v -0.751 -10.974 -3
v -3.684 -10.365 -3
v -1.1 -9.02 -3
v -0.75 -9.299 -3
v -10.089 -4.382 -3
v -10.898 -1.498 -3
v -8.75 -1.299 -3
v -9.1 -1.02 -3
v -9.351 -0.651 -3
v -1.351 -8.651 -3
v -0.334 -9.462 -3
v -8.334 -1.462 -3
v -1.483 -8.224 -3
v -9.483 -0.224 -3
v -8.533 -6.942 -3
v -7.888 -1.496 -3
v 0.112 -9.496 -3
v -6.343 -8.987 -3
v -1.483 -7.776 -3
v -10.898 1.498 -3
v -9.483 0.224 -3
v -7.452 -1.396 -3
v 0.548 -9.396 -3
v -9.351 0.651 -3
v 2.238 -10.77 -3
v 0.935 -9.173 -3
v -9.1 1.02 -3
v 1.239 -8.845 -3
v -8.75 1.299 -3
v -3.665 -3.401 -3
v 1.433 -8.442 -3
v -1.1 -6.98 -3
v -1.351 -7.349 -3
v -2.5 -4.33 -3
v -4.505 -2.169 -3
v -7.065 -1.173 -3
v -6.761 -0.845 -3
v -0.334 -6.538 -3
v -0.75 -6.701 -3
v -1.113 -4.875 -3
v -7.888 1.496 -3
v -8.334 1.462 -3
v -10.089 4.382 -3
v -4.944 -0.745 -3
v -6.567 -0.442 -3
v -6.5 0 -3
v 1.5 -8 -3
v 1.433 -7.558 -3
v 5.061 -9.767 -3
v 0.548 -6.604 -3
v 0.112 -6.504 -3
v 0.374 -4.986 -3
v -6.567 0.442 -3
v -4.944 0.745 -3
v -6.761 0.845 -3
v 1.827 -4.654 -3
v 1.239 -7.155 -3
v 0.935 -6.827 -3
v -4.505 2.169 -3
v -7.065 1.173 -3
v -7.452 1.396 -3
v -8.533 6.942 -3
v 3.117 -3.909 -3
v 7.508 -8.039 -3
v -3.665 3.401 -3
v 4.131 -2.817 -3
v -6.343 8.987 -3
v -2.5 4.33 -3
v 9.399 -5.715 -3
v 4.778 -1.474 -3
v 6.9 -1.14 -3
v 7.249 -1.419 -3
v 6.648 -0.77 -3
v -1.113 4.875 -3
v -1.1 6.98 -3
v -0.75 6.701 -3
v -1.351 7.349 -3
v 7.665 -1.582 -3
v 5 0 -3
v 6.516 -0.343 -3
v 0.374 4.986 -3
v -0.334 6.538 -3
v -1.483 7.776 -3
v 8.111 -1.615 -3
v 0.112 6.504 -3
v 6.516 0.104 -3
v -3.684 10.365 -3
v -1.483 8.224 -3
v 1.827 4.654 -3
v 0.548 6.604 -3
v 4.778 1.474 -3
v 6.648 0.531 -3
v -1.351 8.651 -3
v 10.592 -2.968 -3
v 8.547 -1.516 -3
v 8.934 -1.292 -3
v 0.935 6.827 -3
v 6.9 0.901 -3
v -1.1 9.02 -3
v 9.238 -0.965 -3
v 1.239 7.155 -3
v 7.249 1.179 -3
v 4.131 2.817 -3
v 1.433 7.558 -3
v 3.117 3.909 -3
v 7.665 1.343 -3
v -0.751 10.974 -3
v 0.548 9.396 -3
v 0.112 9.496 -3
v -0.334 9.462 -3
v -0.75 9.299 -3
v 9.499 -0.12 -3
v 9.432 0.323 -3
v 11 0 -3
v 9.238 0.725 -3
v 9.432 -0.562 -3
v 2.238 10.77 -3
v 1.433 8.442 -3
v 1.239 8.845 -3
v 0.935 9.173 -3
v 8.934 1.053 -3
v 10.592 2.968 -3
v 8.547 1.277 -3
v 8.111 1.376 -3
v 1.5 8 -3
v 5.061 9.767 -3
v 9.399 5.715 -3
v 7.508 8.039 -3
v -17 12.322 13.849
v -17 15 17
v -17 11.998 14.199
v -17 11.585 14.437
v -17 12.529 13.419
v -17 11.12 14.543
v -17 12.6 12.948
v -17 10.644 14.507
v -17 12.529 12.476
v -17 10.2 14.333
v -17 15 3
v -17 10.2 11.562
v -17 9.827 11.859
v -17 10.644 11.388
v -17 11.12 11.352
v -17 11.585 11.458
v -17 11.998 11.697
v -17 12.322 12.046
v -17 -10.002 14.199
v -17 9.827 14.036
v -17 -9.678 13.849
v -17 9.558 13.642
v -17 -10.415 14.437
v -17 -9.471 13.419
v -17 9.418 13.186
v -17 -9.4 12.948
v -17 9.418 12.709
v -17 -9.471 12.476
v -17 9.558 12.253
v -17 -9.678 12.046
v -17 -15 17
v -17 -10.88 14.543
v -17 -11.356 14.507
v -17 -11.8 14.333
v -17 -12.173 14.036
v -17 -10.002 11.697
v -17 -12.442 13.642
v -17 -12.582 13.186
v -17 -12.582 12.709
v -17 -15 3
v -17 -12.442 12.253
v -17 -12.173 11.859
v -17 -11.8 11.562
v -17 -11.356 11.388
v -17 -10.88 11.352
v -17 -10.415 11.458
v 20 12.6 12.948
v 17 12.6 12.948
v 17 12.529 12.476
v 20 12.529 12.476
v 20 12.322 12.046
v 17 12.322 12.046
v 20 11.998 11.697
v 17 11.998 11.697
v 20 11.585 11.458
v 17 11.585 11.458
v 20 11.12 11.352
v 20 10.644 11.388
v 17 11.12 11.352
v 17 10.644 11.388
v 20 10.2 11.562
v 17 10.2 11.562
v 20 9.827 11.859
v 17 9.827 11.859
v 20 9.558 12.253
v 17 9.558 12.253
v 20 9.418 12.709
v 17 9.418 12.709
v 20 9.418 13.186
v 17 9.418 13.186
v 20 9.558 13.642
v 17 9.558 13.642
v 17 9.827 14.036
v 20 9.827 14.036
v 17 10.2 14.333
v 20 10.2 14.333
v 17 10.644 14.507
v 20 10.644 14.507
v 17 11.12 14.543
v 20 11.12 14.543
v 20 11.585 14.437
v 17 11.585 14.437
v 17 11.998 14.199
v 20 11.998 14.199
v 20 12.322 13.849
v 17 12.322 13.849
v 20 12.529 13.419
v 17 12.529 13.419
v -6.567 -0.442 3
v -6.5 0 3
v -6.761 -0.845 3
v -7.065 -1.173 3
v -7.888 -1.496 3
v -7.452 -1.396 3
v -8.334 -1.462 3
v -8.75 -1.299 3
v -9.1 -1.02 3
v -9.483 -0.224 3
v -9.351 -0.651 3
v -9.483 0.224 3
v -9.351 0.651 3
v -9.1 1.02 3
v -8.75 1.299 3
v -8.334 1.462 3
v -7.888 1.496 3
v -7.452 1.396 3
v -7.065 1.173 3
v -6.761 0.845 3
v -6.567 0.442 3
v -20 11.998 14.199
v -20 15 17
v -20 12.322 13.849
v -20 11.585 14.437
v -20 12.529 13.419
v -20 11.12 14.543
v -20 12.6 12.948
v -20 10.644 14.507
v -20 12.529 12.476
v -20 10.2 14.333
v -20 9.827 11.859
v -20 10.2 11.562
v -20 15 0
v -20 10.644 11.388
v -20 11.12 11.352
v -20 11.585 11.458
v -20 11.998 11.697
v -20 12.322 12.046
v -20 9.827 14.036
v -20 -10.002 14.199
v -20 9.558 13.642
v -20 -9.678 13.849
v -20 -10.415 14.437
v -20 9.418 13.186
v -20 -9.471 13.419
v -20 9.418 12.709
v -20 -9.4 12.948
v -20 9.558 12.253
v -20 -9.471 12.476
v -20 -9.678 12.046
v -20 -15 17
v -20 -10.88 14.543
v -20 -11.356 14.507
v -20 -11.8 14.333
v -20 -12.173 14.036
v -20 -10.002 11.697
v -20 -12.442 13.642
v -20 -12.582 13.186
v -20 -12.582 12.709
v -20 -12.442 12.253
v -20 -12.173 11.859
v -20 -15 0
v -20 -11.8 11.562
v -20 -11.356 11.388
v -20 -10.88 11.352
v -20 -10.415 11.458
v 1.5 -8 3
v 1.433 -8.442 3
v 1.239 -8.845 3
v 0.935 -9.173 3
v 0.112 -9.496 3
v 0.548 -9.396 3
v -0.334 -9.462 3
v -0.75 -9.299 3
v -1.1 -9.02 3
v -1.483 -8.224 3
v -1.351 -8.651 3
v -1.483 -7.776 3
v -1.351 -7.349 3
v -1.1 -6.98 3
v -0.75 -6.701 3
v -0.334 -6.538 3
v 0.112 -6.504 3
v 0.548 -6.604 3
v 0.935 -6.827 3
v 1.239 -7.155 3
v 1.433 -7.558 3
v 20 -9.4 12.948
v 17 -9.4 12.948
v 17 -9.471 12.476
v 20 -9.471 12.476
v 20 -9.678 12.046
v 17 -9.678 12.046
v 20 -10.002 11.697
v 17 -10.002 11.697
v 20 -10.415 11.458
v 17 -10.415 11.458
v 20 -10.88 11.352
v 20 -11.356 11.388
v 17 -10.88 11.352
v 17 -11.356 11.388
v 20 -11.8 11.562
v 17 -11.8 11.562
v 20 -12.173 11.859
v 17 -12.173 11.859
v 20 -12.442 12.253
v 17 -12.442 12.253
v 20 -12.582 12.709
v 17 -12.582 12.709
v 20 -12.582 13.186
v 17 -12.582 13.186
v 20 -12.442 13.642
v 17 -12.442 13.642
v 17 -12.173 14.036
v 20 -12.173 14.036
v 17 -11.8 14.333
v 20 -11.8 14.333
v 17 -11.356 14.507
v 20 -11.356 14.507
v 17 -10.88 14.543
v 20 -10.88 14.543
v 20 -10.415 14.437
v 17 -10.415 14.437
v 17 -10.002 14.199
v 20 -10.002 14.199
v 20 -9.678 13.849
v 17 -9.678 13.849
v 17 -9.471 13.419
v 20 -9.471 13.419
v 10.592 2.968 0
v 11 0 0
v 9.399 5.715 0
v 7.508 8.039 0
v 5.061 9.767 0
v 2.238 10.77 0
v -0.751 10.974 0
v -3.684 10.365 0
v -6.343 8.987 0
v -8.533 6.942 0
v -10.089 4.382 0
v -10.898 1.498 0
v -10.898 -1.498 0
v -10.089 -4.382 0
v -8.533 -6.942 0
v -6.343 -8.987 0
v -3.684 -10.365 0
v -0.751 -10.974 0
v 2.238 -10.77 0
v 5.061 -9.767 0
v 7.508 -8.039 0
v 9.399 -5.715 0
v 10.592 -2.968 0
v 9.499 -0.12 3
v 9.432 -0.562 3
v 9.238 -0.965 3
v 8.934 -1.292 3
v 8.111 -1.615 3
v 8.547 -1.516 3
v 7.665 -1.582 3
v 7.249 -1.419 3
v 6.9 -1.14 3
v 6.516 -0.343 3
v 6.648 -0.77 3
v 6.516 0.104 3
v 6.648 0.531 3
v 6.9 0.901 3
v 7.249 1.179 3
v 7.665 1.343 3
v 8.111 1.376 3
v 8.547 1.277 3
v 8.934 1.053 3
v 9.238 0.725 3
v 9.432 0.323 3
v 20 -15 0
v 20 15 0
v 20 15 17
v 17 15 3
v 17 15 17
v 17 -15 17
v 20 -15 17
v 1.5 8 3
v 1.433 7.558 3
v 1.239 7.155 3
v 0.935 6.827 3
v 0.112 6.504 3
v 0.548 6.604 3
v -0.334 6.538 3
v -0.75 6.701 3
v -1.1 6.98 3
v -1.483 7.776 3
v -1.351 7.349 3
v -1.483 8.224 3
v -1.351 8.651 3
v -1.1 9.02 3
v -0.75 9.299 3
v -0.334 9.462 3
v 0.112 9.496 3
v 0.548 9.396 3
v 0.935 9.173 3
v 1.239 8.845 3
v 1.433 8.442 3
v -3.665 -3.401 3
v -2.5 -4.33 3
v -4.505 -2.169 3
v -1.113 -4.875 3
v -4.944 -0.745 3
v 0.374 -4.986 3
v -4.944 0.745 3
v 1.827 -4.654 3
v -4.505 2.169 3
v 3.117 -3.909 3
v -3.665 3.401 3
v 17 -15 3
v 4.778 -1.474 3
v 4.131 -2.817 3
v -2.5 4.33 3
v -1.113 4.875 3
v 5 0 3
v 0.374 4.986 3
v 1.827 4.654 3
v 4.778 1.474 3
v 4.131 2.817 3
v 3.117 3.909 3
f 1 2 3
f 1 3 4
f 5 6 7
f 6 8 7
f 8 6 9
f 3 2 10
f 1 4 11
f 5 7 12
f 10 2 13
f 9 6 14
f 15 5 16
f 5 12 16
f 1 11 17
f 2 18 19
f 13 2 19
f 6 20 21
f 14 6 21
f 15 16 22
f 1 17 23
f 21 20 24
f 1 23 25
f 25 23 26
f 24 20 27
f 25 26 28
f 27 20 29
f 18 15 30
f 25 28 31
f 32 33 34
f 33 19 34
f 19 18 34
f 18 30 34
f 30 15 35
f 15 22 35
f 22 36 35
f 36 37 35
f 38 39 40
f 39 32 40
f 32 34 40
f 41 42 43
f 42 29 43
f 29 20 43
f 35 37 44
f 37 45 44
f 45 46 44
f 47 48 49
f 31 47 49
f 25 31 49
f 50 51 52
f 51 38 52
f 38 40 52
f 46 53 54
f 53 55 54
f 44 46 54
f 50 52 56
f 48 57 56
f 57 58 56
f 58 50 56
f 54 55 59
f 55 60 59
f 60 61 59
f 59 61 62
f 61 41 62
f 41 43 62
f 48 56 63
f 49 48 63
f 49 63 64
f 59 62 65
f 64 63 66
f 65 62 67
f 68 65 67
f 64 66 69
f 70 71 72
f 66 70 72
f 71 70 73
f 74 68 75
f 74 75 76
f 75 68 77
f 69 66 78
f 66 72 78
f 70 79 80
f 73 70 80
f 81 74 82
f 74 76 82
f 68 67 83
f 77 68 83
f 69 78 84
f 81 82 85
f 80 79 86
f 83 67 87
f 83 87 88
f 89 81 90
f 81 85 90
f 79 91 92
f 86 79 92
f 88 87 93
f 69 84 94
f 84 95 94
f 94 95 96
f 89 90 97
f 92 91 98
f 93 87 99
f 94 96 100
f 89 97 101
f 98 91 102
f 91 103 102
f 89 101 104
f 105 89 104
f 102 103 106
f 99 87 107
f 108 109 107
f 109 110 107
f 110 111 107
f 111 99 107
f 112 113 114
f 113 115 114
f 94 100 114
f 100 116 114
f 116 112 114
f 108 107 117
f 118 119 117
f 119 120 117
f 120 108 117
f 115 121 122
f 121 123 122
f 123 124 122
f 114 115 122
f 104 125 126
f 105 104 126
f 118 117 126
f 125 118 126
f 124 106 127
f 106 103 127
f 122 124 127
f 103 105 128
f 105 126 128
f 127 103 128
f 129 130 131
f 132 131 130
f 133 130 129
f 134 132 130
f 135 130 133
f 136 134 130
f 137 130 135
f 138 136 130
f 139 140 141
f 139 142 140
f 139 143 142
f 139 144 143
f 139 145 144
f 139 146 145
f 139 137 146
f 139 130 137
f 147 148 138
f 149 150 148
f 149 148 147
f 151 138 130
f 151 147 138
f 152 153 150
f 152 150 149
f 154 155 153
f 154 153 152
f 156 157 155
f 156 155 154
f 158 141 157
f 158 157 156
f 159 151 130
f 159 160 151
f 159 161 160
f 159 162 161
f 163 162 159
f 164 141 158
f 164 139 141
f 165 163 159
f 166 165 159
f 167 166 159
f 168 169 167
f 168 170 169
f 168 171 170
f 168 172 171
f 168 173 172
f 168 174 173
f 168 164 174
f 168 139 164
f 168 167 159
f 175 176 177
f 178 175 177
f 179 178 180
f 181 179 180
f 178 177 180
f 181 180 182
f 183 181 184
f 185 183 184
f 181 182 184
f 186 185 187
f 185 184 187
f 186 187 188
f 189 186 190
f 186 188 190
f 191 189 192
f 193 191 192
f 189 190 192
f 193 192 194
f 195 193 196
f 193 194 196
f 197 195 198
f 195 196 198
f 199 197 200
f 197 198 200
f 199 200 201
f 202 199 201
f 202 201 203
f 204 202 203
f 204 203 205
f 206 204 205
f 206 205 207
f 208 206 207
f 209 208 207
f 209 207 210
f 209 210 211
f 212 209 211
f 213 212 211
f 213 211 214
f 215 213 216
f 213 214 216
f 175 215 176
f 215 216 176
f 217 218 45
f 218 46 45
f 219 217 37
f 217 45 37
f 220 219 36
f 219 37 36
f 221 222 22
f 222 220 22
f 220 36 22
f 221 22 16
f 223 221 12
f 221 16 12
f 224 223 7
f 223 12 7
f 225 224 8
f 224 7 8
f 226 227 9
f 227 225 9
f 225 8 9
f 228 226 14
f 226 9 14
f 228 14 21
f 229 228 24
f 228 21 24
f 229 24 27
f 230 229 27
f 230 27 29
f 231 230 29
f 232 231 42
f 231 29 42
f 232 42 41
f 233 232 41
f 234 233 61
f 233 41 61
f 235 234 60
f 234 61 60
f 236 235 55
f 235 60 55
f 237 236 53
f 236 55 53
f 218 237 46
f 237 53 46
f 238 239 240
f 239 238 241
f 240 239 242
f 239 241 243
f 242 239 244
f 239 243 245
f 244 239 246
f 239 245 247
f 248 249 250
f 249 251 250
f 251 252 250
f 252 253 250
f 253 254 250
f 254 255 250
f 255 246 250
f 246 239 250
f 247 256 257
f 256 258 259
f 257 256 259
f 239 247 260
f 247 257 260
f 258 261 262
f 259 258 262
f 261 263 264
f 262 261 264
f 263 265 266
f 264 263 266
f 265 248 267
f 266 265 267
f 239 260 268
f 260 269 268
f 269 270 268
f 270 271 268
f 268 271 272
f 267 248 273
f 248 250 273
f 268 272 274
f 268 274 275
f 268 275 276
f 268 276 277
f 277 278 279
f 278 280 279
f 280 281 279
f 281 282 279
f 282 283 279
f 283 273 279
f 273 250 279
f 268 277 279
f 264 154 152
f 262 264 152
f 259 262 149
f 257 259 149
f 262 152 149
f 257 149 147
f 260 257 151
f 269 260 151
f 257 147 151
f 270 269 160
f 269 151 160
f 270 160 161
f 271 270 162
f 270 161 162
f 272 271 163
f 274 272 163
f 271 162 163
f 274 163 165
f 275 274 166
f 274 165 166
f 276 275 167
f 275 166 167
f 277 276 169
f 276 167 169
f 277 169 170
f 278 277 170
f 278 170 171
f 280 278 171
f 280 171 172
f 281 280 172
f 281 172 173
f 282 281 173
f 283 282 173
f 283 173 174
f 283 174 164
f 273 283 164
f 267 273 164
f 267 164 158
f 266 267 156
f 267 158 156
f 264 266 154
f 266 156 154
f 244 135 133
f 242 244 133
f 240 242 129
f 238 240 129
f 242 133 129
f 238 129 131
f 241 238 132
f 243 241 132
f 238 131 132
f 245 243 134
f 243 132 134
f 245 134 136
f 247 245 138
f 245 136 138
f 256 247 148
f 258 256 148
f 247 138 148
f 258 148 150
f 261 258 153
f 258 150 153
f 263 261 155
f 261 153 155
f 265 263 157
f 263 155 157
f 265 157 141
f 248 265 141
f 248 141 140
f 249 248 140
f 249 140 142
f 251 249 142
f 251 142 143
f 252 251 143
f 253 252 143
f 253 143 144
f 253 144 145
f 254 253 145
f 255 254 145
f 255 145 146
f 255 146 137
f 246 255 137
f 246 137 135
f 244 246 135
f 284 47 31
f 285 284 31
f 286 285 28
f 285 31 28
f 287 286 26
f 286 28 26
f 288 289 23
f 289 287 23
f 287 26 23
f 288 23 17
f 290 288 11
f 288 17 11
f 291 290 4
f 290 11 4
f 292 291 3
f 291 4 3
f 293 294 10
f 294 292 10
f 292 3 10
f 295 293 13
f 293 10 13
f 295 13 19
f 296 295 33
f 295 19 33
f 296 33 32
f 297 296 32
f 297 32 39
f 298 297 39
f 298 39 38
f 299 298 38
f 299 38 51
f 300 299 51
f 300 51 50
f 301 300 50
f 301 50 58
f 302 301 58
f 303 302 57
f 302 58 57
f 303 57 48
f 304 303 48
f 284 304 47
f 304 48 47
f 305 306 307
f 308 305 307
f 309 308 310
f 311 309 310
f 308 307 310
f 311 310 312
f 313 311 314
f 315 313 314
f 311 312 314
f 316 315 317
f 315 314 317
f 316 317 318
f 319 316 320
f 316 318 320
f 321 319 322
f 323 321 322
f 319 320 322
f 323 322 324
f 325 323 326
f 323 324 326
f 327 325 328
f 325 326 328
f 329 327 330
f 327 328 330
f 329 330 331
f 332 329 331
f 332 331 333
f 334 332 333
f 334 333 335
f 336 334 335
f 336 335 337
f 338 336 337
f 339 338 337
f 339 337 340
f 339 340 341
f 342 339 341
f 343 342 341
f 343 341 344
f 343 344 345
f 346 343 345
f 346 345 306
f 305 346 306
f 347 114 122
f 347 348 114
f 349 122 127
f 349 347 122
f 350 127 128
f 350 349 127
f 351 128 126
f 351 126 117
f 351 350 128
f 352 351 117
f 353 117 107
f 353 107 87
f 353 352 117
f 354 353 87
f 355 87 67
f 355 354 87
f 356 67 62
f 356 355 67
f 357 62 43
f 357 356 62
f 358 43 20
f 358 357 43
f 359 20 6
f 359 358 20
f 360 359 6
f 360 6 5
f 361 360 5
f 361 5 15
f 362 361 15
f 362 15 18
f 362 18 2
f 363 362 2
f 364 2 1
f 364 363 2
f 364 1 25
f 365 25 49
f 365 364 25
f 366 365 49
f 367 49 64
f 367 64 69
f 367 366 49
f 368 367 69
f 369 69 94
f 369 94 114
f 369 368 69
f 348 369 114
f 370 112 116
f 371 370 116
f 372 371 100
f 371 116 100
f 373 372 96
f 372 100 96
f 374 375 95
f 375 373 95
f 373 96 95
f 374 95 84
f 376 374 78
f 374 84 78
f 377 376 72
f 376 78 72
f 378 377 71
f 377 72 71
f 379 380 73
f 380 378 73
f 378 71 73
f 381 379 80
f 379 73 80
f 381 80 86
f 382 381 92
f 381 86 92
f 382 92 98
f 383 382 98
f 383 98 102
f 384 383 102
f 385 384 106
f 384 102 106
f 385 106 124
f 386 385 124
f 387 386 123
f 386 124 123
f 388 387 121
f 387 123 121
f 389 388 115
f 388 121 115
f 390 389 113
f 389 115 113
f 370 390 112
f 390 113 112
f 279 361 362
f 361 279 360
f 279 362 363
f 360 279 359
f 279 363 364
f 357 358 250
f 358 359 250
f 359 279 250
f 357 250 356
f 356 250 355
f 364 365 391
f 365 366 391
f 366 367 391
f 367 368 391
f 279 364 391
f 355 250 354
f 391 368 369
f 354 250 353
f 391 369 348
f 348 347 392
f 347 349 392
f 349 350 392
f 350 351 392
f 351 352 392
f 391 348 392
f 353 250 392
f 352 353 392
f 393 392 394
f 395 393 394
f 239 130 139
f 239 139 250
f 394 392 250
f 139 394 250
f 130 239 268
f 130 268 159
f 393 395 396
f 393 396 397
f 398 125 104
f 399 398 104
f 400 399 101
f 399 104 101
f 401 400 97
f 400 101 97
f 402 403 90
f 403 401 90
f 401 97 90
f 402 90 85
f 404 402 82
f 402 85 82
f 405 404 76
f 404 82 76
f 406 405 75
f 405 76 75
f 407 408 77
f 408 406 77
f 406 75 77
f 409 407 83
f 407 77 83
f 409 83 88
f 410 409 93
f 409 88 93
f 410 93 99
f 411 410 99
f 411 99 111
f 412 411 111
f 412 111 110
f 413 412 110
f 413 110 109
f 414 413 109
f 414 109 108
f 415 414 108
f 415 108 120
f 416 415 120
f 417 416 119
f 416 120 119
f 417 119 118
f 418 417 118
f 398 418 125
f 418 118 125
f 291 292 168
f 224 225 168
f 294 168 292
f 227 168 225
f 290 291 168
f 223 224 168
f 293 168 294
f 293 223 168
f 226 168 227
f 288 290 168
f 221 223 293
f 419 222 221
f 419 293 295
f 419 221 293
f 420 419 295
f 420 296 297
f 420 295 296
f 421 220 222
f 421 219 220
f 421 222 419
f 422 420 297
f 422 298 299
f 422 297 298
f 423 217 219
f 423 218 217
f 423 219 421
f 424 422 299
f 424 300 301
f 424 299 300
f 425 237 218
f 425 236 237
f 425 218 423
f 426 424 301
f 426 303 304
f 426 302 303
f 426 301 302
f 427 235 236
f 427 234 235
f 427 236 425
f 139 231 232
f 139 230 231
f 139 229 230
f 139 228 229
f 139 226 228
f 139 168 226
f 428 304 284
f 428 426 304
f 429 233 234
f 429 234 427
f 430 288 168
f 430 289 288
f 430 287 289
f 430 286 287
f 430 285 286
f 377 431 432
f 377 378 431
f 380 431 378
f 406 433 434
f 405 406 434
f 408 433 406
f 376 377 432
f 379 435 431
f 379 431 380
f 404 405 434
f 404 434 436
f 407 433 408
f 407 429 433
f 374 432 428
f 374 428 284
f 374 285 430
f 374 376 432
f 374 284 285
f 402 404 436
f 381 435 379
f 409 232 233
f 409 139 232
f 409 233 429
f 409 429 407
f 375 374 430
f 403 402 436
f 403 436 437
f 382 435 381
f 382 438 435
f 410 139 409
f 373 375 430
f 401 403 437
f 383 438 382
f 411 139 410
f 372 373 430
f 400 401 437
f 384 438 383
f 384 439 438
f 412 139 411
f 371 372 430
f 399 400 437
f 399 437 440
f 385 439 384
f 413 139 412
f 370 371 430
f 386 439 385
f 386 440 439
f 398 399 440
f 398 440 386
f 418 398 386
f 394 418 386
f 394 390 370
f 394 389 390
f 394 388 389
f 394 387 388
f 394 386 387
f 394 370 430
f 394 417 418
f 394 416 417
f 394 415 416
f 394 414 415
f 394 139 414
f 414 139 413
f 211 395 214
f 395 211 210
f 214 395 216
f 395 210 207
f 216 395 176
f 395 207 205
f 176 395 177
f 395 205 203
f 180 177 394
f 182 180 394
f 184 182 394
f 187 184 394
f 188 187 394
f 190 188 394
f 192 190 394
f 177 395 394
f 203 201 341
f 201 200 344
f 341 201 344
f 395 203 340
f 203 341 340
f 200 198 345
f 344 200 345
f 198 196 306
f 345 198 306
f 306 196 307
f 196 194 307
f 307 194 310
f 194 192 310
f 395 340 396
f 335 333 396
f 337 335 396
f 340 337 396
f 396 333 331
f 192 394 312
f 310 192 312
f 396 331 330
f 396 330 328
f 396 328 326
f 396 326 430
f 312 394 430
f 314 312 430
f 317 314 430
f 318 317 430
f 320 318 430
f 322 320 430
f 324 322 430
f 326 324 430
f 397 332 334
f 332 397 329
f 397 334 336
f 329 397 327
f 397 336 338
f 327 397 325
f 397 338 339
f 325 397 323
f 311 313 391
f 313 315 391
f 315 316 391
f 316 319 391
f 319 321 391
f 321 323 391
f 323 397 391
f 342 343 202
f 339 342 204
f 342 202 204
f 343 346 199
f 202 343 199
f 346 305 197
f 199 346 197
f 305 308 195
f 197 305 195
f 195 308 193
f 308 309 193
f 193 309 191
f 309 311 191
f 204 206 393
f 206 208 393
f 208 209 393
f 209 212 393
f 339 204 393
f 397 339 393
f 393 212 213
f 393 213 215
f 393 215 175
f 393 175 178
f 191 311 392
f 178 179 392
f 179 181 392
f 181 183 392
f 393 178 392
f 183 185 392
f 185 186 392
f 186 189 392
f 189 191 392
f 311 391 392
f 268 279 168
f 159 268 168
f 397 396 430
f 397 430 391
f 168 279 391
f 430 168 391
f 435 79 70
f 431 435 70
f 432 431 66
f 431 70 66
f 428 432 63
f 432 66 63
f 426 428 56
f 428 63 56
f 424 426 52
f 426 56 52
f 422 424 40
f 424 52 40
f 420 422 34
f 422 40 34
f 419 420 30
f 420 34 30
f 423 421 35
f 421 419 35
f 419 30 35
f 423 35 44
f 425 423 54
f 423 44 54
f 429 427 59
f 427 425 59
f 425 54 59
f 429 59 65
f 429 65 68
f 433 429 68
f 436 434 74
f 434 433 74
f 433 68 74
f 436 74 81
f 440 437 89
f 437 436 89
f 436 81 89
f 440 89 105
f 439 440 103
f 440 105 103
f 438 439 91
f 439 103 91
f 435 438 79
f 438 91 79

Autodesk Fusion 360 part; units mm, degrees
sketch "Sketch1" plane through (0, 0, 0) normal (0, 0, 1) x (1, 0, 0)
  line L0 (20, 15) -> (-20, 15)
  line L1 (-20, 15) -> (-20, -15)
  line L2 (-20, -15) -> (20, -15)
  line L3 (20, -15) -> (20, 15)
  line L4 (20, 15) -> (-20, -15) construction
  line L5 (-20, 15) -> (20, -15) construction
  circle A0 centre (0, 0) radius 11
  circle A1 centre (0, 0) radius 8 construction
  circle A2 centre (0, 0) radius 5
  circle A3 centre (0, 8) radius 1.5
  circle A4 centre (0, -8) radius 1.5
  circle A5 centre (7.9991, -0.1196) radius 1.5
  circle A6 centre (-8, 0) radius 1.5
  line L6 (-20, 15) -> (-17, 15)
  line L7 (-17, 15) -> (-17, -15)
  line L8 (-17, -15) -> (-20, -15)
  line L9 (-20, -15) -> (-20, 15)
  line L10 (-20, 15) -> (-17, -15) construction
  line L11 (-17, 15) -> (-20, -15) construction
  line L12 (0, 15) -> (0, -15) construction
  line L13 (20, -15) -> (20, 15)
  line L14 (17, 15) -> (17, -15)
  line L15 (17, -15) -> (20, -15)
  line L16 (20, 15) -> (17, 15)
  point P0 (-18.5, 0)
  dimension "d1" = 40
  dimension "d2" = 30
  dimension "d3" = 22
  dimension "d4" = 16
  dimension "d5" = 10
  dimension "d6" = 3
  dimension "d7" = 3
  dimension "d9" = 3
  dimension "d10" = 3
  dimension "d11" = 30
  dimension "d12" = 3
extrude "Extrude1" add sketch "Sketch1" along normal blind 3 contours L0 L2 L7 L14
extrude "Extrude2" add sketch "Sketch1" along normal blind 3 contours A0
extrude "Extrude3" add sketch "Sketch1" against normal blind 3 contours A0
extrude "Extrude4" add sketch "Sketch1" along normal blind 17 contours L0 L1 L2 L6 L7 L8 L9
extrude "Extrude5" add sketch "Sketch1" along normal blind 17 contours L0 L2 L3 L13 L14 L15 L16
sketch "Sketch2" plane through (0, 0, 0) normal (1, 0, 0) x (0, 1, 0)
  line L0 (-15, 12.9476) -> (15, 12.9476) construction
  line L1 (-15, 16.9476) -> (15, 16.9476) construction
  line L2 (0, 16.9476) -> (0, 0) construction
  line L3 (-11, 16.9476) -> (-11, 0) construction
  line L4 (11, 16.9476) -> (11, 0) construction
  circle A0 centre (-11, 12.9476) radius 1.6
  circle A1 centre (11, 12.9476) radius 1.6
  dimension "d23" = 4
  dimension "d24" = 11
  dimension "d25" = 3.2
extrude "Extrude6" cut sketch "Sketch2" along normal blind 28
extrude "Extrude7" cut sketch "Sketch2" against normal blind 25
